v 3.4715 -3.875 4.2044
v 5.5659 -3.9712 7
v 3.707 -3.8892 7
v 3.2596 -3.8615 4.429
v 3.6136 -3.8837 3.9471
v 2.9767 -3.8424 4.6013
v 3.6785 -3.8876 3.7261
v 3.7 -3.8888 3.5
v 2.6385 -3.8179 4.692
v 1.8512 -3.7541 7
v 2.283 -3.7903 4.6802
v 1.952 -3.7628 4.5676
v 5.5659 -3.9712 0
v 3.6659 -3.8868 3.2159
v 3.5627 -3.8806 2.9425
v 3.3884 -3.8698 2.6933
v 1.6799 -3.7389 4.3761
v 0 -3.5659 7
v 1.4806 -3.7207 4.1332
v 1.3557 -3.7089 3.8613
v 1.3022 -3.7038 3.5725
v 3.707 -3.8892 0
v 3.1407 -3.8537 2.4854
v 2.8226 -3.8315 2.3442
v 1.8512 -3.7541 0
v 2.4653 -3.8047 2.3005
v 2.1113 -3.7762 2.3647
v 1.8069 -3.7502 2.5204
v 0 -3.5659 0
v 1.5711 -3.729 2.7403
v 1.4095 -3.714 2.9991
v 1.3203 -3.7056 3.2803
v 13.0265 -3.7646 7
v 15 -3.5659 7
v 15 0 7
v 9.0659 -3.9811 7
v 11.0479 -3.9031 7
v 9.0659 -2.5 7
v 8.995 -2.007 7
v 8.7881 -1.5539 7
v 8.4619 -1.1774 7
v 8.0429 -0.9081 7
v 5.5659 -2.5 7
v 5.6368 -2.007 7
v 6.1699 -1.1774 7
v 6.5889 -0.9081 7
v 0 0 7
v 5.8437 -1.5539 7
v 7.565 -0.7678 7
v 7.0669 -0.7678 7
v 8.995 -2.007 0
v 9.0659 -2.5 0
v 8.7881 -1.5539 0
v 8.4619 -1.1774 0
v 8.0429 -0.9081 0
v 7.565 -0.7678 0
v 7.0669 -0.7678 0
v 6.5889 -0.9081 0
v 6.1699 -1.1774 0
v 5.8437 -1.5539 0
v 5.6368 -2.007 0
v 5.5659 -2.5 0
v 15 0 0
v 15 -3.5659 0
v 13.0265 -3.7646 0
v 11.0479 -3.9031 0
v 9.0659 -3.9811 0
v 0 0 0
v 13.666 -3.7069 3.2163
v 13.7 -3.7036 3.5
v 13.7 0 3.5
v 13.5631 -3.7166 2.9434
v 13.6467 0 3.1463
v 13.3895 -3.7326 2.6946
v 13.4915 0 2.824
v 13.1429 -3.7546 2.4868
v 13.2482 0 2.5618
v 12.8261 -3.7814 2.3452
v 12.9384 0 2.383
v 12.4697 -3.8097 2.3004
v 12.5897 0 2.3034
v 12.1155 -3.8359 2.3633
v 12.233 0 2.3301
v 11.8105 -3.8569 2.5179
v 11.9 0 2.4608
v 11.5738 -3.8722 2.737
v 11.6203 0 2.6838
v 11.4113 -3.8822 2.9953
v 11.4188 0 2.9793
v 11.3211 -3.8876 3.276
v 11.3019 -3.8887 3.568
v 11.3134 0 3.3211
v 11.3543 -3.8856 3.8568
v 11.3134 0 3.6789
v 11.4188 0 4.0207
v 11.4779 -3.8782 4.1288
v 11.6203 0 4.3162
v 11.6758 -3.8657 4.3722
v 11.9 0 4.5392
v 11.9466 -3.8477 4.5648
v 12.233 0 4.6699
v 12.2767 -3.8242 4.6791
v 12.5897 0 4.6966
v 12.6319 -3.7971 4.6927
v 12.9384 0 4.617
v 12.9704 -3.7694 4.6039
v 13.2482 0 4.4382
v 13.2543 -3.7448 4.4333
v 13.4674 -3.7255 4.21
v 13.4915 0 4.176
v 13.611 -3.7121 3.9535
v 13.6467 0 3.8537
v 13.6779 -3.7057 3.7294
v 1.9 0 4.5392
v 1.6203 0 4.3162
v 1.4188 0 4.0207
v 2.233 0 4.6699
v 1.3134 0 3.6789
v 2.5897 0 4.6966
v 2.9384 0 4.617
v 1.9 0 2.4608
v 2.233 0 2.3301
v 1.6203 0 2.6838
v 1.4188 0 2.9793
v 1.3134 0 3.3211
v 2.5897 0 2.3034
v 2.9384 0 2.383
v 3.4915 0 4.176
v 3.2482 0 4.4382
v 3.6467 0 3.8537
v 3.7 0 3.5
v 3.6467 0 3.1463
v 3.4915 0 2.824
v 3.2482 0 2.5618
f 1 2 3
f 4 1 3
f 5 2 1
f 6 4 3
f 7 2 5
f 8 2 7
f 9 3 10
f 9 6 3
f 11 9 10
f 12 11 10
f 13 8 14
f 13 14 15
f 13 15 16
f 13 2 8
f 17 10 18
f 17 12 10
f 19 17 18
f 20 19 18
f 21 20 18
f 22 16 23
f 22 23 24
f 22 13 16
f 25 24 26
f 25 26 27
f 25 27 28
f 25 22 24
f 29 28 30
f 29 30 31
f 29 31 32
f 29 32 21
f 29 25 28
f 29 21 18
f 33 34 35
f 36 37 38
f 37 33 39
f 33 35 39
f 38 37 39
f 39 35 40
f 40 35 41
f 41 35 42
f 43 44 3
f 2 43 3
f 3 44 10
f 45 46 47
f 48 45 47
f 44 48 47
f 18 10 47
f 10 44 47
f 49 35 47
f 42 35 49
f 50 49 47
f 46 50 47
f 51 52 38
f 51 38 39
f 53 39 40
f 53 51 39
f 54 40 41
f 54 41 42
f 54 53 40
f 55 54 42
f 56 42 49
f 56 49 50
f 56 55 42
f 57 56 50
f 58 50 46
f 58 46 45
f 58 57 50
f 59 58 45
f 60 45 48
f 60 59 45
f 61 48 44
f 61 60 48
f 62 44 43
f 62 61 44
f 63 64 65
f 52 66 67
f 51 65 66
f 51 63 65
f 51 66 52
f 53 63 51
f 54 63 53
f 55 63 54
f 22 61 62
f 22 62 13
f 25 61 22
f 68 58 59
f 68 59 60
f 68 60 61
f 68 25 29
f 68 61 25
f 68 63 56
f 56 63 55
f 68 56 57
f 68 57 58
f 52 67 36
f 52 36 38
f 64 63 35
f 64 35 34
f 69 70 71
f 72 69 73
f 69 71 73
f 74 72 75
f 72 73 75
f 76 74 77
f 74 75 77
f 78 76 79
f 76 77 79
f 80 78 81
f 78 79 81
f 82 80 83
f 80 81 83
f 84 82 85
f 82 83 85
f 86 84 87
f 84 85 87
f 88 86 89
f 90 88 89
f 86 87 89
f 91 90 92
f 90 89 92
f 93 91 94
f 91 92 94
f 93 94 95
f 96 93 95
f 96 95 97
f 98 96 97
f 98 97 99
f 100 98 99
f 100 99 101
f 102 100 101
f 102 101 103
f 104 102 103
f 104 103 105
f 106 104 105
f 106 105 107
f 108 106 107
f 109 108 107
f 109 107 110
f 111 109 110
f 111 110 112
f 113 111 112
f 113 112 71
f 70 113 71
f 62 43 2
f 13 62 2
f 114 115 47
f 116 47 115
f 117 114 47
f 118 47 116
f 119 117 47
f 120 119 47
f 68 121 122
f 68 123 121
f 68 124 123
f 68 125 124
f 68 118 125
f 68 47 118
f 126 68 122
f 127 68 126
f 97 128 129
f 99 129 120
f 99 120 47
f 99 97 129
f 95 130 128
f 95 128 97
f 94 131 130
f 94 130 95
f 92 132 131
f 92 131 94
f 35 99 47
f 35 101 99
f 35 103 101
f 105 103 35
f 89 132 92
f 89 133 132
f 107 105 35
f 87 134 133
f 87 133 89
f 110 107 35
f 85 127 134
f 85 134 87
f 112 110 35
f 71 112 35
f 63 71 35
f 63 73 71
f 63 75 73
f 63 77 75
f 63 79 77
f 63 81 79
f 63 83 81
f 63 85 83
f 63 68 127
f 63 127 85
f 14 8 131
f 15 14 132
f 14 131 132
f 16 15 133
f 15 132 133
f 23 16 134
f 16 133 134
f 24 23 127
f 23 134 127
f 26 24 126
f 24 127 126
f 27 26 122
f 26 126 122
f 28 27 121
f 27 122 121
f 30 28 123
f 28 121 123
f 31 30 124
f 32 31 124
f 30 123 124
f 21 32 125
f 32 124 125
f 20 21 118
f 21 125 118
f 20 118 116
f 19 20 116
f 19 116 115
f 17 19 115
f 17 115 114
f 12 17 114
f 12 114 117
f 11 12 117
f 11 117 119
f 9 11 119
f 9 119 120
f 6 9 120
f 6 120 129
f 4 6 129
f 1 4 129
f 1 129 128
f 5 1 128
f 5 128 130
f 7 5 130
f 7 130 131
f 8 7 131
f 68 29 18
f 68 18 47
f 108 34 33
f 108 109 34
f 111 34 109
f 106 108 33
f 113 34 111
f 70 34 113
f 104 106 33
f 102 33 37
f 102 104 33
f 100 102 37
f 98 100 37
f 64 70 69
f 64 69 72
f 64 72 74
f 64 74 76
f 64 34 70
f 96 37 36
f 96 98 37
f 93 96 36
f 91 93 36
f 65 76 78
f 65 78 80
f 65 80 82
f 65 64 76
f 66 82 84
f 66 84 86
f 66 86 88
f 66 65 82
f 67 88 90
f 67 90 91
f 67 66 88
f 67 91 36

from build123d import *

# Parameters (mm, degrees)
BOSS_EXTRUDE1_DEPTH = 7
SKETCH2_R           = 1.2
CUT_EXTRUDE1_DEPTH  = 10


with BuildPart() as part:
    # Sketch1 → Boss-Extrude1 (new body)
    with BuildSketch(Plane.XY):
        with BuildLine():
            Line((0, 0), (15, 0))
            Line((15, 0), (15, -3.565857851))
            ThreePointArc((15, -3.565857851), (12.037715119, -3.841415326), (9.065924059, -3.981134815))
            Line((9.065924059, -3.981134815), (9.065924059, -2.5))
            ThreePointArc((9.065924059, -2.5), (7.315924059, -0.75), (5.565924059, -2.5))
            Line((5.565924059, -2.5), (5.565924059, -3.971219399))
            ThreePointArc((5.565924059, -3.971219399), (2.778609663, -3.828299941), (0, -3.565857851))
            Line((0, -3.565857851), (0, 0))
        make_face()
    extrude(amount=BOSS_EXTRUDE1_DEPTH)

    # Sketch2 → Cut-Extrude1 (cut)
    with BuildSketch(Plane(origin=(0, 0, 0), x_dir=(1, 0, 0), z_dir=(0, 1, 0))):
        with Locations((12.5, -3.5)):
            Circle(SKETCH2_R)
        with Locations((2.5, -3.5)):
            Circle(SKETCH2_R)
    extrude(amount=-CUT_EXTRUDE1_DEPTH, mode=Mode.SUBTRACT)


solid = part.part
